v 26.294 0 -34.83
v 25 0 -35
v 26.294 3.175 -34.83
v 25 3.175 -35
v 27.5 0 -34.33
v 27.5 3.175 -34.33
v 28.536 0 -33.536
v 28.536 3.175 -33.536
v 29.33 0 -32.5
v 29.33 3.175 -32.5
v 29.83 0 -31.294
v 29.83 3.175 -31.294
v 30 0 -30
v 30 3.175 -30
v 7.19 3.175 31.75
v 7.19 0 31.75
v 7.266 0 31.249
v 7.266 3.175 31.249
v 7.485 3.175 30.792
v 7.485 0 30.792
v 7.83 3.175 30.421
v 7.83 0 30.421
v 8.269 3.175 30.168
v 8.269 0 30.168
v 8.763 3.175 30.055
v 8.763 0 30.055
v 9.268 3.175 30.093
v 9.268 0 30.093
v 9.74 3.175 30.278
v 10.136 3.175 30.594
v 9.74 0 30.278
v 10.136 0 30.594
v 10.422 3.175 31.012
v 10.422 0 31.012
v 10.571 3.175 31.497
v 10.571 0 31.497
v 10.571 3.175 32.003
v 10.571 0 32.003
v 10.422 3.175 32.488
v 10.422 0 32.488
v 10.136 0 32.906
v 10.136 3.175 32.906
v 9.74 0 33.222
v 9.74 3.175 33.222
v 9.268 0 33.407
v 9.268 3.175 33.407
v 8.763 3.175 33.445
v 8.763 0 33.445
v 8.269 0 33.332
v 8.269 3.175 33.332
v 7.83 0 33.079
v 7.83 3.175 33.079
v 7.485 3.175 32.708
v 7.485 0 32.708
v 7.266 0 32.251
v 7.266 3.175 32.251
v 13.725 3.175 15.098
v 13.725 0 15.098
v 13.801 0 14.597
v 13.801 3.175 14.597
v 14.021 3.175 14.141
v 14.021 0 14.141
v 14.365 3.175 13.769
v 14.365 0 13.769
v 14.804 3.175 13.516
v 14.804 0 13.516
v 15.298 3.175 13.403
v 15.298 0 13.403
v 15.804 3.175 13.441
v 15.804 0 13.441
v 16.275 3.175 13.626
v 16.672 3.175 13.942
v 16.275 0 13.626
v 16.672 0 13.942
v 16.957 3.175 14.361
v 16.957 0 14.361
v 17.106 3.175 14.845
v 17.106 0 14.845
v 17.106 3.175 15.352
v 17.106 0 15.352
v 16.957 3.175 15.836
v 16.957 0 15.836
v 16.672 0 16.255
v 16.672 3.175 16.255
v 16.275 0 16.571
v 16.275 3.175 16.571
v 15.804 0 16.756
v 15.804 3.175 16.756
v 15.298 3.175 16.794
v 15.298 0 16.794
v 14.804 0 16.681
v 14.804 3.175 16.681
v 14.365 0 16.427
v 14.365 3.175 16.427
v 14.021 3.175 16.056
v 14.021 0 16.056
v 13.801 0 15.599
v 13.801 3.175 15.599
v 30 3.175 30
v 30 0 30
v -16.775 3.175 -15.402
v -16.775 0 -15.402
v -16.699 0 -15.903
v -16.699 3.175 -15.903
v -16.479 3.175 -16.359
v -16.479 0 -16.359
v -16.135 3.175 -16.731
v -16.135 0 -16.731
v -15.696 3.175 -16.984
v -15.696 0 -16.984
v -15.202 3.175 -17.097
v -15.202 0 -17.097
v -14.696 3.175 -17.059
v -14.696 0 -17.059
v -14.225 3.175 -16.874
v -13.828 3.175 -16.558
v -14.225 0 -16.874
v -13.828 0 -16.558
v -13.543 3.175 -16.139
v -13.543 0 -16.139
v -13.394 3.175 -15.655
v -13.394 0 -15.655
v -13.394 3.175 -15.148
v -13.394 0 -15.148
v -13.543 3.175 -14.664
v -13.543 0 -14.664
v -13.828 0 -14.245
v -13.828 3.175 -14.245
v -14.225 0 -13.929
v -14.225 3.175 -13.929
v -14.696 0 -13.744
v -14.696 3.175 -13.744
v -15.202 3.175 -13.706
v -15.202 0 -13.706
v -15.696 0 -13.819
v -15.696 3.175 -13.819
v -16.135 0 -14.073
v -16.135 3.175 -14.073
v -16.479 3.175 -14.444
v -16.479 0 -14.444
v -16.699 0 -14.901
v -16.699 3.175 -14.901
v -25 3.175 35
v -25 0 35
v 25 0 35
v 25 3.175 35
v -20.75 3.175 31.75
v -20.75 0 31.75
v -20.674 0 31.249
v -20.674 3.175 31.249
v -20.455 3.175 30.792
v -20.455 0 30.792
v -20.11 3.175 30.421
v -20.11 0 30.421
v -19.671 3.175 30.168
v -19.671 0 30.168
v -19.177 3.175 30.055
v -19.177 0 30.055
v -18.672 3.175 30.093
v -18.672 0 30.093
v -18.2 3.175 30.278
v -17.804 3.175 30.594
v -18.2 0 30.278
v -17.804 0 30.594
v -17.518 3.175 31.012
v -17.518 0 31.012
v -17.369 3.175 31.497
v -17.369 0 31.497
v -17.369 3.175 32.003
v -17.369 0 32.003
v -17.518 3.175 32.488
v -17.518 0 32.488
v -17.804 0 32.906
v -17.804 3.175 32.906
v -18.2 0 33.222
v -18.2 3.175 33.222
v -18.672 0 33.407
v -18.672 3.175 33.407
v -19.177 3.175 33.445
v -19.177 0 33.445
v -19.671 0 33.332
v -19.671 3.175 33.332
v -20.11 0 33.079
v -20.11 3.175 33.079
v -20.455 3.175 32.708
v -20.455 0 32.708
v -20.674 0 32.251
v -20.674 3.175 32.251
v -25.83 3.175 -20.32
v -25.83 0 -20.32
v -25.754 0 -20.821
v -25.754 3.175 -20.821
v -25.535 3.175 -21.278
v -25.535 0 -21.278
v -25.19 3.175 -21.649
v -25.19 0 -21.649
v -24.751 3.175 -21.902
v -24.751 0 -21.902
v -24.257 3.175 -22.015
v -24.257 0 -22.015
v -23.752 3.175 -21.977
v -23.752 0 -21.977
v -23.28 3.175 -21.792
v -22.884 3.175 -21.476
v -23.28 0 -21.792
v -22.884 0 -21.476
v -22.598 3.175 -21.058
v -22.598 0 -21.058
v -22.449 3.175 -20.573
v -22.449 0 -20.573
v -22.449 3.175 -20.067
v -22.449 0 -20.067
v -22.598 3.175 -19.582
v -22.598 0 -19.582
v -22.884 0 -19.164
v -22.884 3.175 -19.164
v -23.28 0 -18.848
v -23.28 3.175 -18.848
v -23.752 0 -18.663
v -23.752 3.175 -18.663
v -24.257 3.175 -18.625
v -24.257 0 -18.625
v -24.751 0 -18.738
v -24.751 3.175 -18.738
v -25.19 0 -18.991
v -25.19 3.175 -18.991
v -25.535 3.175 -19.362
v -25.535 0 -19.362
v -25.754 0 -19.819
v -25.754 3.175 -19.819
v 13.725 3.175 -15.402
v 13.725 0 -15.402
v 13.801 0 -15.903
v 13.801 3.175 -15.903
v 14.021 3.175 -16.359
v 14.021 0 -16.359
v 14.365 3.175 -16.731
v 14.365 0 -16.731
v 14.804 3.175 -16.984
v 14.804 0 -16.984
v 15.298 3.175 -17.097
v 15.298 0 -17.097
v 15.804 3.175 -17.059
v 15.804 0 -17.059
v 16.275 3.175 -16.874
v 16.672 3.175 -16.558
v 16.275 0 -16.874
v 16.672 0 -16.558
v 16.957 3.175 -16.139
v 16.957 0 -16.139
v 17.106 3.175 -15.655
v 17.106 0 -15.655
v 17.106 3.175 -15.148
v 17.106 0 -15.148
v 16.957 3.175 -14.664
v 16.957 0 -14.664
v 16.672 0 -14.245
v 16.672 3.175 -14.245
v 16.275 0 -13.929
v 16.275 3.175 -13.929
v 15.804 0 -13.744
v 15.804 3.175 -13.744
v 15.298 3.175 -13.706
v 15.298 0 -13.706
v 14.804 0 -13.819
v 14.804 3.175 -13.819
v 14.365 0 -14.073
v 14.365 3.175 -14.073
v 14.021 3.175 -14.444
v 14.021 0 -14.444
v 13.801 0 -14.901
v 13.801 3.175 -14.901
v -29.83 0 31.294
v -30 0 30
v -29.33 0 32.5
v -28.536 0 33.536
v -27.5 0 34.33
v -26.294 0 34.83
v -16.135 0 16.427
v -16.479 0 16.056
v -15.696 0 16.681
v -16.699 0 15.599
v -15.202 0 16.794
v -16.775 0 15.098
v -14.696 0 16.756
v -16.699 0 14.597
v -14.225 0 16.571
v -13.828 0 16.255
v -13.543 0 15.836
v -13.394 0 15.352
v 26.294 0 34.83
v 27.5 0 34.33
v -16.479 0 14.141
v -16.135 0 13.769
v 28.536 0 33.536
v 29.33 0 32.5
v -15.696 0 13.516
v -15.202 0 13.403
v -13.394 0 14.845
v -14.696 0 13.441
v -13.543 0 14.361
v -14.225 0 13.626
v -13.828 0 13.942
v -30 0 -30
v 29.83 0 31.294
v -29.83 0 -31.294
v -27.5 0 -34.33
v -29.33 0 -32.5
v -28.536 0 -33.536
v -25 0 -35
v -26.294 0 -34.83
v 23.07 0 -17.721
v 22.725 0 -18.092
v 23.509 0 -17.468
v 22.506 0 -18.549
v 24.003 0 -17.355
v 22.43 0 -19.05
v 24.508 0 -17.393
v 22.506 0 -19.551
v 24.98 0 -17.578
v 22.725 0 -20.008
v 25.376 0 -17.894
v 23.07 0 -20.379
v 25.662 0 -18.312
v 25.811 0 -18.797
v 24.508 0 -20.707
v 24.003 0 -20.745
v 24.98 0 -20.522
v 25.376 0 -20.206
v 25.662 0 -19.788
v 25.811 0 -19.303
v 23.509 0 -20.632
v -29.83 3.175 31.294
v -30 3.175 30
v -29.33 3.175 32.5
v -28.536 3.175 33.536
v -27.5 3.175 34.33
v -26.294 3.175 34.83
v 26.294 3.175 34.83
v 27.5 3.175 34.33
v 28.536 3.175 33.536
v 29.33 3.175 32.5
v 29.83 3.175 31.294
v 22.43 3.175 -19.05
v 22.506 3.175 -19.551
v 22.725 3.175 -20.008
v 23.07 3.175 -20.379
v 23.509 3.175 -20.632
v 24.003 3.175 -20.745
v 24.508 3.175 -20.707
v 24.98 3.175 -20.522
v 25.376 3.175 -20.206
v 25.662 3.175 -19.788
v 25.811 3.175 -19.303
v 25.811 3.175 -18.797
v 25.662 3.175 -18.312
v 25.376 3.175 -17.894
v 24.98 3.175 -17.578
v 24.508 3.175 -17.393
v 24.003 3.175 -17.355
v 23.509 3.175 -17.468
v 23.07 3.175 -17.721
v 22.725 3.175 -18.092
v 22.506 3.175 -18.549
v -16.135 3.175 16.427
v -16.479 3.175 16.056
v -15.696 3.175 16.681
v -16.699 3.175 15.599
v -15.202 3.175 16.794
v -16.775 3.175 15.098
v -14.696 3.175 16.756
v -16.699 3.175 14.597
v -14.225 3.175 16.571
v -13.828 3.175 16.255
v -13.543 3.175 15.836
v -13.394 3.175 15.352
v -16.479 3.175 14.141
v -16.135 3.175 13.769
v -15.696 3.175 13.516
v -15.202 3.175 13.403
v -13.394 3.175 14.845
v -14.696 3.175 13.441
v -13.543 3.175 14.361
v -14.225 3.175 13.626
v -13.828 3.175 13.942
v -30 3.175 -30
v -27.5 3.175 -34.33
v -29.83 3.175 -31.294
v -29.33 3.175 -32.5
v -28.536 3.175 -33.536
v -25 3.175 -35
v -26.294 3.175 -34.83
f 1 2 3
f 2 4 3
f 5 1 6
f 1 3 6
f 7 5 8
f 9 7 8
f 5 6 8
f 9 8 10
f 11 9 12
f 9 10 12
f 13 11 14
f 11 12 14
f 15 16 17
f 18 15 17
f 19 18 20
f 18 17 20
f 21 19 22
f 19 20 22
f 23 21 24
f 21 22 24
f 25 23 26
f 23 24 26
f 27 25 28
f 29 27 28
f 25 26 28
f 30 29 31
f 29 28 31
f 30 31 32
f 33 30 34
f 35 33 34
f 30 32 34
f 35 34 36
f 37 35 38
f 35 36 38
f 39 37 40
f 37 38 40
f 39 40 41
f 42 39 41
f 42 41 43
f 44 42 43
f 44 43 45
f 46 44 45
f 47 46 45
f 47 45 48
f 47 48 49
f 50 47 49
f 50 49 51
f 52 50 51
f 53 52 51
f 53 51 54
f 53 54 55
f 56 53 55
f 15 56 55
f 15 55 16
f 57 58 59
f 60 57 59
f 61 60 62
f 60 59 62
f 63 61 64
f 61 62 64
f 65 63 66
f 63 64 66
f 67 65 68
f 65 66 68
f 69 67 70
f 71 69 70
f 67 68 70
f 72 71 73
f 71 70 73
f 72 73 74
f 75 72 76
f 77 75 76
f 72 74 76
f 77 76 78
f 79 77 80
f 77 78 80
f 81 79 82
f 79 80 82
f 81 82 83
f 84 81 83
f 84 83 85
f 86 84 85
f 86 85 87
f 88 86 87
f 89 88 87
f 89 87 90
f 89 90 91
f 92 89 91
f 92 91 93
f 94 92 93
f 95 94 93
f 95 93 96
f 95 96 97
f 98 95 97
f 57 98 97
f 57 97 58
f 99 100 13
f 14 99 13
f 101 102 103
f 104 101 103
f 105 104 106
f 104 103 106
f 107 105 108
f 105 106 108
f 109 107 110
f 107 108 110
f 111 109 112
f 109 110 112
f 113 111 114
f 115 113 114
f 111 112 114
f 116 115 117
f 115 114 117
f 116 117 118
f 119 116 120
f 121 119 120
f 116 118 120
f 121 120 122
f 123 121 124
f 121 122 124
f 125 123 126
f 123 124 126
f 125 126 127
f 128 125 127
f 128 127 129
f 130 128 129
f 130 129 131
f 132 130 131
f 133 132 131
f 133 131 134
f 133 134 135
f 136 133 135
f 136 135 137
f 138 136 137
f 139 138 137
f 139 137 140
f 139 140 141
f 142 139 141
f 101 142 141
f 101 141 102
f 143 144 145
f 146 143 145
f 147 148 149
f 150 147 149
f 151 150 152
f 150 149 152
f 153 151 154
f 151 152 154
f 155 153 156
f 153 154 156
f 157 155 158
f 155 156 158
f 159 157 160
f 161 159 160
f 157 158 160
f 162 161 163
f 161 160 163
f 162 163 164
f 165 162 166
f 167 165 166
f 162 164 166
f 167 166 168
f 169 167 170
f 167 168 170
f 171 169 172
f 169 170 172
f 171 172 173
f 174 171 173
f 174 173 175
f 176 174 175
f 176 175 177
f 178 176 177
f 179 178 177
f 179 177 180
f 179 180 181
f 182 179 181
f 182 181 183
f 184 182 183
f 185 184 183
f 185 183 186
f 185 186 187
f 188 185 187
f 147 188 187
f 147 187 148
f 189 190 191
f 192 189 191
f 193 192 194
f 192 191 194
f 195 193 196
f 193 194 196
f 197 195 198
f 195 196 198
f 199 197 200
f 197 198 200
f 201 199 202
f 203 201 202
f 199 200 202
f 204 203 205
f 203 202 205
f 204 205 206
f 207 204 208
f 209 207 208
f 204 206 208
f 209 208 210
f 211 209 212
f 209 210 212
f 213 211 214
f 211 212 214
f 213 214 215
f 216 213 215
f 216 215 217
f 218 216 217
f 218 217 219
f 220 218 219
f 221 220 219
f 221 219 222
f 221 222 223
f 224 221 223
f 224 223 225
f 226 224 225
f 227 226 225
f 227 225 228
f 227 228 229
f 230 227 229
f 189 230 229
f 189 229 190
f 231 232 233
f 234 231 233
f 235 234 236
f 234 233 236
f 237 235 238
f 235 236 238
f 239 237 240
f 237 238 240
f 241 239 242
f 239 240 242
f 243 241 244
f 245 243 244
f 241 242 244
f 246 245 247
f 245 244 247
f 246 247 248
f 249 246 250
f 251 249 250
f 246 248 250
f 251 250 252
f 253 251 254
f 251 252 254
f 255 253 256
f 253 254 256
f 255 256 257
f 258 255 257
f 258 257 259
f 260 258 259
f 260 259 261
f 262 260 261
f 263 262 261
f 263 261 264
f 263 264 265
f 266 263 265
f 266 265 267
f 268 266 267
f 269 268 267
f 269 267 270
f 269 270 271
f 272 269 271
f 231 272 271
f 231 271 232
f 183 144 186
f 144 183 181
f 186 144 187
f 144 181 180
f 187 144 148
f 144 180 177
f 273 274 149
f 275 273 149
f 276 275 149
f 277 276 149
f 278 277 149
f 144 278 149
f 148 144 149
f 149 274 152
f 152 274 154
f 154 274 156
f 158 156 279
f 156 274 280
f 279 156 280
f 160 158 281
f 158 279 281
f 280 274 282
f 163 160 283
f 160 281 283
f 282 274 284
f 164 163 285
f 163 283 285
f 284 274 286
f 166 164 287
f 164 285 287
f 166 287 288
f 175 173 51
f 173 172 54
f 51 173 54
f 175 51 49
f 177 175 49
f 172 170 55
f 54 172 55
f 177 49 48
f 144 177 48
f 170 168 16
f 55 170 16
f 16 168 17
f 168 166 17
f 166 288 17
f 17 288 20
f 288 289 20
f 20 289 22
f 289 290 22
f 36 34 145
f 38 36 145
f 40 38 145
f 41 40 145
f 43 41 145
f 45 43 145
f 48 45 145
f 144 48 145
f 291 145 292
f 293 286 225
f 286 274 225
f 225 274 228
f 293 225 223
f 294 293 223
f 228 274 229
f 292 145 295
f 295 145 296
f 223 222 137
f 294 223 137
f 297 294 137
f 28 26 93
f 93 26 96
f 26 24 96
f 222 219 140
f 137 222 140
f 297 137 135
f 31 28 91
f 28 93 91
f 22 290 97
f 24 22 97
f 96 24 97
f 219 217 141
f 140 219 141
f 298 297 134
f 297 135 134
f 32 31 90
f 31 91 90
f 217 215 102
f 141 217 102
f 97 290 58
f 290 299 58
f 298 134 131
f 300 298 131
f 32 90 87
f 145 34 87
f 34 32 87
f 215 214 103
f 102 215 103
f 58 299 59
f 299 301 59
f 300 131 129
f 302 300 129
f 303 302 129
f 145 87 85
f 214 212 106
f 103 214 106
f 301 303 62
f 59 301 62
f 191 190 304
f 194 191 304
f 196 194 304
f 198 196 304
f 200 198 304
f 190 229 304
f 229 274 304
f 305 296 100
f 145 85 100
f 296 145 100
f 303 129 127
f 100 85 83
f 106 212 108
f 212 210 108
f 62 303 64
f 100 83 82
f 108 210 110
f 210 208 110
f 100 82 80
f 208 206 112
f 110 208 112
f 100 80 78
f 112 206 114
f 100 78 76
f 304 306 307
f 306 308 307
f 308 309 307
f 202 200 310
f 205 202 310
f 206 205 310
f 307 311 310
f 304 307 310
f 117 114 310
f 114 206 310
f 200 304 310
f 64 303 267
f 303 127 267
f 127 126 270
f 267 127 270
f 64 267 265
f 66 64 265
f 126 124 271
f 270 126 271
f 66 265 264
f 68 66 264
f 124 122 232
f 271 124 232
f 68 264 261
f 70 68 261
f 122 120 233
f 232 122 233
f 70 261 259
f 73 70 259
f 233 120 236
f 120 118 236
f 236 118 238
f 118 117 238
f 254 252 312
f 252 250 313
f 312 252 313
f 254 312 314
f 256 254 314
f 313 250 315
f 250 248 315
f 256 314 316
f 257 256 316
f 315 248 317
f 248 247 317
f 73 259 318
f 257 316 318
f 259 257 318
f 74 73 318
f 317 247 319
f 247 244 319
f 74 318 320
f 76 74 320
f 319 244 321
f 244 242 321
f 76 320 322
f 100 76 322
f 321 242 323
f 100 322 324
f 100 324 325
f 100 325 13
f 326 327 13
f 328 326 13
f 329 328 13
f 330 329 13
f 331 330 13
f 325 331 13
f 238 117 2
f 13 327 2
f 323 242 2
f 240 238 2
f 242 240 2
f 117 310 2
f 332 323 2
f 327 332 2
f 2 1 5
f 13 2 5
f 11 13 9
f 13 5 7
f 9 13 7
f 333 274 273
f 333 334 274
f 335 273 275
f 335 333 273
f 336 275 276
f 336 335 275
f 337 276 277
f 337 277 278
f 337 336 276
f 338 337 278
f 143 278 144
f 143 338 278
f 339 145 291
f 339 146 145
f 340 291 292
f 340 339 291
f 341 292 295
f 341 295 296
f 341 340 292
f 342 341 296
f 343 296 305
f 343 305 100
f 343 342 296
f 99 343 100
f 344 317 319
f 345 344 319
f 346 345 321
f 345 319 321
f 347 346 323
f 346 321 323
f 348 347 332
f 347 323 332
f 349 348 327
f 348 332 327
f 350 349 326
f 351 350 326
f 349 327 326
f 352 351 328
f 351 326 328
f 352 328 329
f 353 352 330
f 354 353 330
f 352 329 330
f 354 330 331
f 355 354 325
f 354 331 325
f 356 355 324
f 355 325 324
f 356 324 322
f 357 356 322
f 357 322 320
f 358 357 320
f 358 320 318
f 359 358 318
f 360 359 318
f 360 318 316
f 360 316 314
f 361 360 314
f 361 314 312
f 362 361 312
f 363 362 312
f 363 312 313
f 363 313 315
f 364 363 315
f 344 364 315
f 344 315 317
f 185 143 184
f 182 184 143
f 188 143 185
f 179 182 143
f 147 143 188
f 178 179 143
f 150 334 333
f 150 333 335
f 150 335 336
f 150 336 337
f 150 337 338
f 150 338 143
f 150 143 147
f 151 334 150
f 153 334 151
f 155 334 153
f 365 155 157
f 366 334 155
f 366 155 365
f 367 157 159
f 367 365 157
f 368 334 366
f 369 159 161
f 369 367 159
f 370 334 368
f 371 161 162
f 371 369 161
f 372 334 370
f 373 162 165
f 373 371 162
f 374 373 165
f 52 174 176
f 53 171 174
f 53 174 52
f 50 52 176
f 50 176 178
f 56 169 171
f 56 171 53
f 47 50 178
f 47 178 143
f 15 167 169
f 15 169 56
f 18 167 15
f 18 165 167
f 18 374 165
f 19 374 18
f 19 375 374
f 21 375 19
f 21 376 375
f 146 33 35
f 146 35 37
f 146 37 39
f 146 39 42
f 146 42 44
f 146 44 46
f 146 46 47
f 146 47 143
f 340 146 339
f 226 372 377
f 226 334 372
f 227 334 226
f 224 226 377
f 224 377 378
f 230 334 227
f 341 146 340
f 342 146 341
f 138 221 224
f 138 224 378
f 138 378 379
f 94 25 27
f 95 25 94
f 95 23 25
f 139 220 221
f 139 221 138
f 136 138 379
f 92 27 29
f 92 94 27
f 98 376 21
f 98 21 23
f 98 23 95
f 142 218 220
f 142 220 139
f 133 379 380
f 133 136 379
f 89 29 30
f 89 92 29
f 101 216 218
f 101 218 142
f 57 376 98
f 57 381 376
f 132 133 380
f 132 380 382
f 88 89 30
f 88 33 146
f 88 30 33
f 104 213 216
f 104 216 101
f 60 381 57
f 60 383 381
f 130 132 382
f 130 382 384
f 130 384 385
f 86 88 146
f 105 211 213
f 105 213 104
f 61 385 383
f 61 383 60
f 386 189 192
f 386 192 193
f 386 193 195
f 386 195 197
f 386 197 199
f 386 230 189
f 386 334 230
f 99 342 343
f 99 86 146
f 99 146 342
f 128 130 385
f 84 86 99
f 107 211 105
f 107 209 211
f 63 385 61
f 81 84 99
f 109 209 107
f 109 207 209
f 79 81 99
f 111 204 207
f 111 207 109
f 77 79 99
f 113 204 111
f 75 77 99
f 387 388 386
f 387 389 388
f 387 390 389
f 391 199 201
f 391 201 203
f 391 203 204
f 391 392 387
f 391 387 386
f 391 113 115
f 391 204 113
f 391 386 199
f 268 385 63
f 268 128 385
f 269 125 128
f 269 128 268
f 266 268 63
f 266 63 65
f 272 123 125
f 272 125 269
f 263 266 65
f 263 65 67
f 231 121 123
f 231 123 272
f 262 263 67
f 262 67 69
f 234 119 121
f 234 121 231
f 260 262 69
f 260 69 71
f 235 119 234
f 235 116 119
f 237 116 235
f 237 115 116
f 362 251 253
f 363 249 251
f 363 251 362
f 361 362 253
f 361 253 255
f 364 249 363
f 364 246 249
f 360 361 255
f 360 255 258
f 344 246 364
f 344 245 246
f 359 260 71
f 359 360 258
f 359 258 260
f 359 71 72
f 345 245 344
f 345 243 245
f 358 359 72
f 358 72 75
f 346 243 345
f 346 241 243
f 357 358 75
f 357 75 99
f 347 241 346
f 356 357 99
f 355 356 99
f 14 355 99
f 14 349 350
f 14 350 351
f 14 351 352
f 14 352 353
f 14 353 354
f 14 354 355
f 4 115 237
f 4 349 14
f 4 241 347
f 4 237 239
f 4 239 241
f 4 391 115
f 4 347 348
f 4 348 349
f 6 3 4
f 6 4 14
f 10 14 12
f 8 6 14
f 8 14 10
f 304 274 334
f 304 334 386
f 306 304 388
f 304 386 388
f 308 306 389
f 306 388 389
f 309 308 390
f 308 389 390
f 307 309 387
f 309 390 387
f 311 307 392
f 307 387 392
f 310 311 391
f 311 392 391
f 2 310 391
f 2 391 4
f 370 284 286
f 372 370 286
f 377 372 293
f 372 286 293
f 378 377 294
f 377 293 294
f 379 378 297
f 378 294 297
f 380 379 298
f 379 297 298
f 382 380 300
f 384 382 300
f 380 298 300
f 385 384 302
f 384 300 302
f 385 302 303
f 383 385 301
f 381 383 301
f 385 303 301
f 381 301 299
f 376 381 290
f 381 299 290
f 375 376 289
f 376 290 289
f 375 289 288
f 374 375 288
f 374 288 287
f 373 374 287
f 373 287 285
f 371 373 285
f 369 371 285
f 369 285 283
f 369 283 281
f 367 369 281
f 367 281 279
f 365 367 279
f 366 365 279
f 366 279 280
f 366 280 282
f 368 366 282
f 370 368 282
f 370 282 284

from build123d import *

# Parameters (mm, degrees)
SKETCH1_W            = 60
SKETCH1_H            = 70
BOSS_EXTRUDE1_DEPTH  = 3.175
M3_CLEARANCE_HOLE1_D = 3.4
M3_CLEARANCE_HOLE2_D = 3.4
FILLET1_R            = 5


with BuildPart() as part:
    # Sketch1 → Boss-Extrude1 (new body)
    with BuildSketch(Plane(origin=(0, 0, 0), x_dir=(1, 0, 0), z_dir=(0, 1, 0))):
        Rectangle(SKETCH1_W, SKETCH1_H)
    extrude(amount=BOSS_EXTRUDE1_DEPTH)

    # M3 Clearance Hole1 (through all)
    with Locations(Plane(origin=(0, 3.175, 0), x_dir=(1, 0, 0), z_dir=(0, 1, 0))):
        with Locations((15.425418598, 15.401666056), (15.425418598, -15.098333944), (-15.074581402, -15.098333944), (-15.074581402, 15.401666056)):
            Hole(M3_CLEARANCE_HOLE1_D / 2)

    # M3 Clearance Hole2 (through all)
    with Locations(Plane(origin=(0, 3.175, 0), x_dir=(1, 0, 0), z_dir=(0, 1, 0))):
        with Locations((-19.05, -31.75), (8.89, -31.75), (24.13, 19.05), (-24.13, 20.32)):
            Hole(M3_CLEARANCE_HOLE2_D / 2)

    # Fillet1
    fillet1_edges = [part.edges().sort_by_distance(p)[0] for p in [
        (-30, 1.5875, -35),
        (30, 1.5875, -35),
        (30, 1.5875, 35),
        (-30, 1.5875, 35),
    ]]
    fillet(fillet1_edges, radius=FILLET1_R)


solid = part.part
